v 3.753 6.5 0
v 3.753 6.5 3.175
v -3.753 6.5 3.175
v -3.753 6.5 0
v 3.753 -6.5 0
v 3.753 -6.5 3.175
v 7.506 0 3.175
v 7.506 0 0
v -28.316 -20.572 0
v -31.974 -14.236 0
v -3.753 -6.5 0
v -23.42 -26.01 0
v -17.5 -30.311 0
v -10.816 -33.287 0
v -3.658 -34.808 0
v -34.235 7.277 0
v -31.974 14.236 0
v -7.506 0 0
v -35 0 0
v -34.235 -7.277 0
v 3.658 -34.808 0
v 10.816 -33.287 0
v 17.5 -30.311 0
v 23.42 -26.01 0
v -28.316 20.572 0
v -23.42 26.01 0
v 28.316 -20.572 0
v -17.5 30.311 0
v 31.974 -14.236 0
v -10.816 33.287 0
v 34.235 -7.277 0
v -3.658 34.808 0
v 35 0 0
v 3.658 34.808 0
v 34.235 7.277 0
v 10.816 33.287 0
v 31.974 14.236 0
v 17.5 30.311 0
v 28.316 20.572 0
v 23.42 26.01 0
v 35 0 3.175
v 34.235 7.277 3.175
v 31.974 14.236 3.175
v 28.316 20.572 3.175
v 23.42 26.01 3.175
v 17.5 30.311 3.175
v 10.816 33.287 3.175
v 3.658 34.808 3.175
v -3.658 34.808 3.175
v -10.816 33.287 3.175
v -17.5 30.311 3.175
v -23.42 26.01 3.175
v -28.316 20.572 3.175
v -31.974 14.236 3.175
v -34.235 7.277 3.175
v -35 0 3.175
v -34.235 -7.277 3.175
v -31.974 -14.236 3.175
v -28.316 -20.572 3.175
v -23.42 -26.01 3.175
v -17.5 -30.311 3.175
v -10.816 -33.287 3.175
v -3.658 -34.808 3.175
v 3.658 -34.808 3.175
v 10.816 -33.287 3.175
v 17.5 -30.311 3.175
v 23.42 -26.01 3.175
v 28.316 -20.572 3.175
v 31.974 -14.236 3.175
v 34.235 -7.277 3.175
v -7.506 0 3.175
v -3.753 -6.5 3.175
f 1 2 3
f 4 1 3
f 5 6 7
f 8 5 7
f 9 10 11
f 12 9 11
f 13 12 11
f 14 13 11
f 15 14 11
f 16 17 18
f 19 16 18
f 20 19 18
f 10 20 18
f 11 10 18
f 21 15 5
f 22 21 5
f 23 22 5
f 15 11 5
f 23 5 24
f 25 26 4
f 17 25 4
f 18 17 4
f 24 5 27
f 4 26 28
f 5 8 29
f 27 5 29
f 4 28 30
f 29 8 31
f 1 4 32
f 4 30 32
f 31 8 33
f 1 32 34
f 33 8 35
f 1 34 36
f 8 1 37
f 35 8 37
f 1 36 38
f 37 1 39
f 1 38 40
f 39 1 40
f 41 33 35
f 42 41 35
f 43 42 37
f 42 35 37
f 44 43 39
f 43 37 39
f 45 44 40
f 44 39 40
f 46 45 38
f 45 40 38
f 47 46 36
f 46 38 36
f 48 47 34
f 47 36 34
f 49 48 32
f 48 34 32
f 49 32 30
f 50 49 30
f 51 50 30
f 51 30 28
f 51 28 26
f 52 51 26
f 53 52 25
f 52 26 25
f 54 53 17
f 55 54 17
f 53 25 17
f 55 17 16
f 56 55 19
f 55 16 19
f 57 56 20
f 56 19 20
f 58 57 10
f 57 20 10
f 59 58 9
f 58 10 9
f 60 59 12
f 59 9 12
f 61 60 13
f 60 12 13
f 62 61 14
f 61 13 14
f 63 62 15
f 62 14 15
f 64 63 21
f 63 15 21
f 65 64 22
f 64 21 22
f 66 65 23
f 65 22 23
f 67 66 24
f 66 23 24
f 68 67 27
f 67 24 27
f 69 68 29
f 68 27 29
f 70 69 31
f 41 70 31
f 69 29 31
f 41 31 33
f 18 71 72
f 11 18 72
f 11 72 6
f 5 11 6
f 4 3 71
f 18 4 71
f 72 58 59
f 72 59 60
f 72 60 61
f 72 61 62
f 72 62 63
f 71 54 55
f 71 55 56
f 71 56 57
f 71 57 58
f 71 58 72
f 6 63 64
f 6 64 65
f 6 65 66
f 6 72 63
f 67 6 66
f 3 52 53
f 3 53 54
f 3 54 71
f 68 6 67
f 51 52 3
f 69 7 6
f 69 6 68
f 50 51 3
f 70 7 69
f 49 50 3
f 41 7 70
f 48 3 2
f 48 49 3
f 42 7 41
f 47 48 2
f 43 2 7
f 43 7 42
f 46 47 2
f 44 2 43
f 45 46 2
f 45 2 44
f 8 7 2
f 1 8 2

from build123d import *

# Parameters (mm, degrees)
SKETCH1_R           = 35
BOSS_EXTRUDE1_DEPTH = 3.175
CUT_EXTRUDE1_REACH  = 5.175


with BuildPart() as part:
    # Sketch1 → Boss-Extrude1 (new body)
    with BuildSketch(Plane.XY):
        Circle(SKETCH1_R)
    extrude(amount=BOSS_EXTRUDE1_DEPTH)

    # Sketch2 → Cut-Extrude1 (cut, up to next)
    with BuildSketch(Plane.XY.offset(3.175), mode=Mode.PRIVATE) as cut_extrude1_sk1:
        Polygon((7.505553499, 0), (3.75277675, 6.5), (-3.75277675, 6.5), (-7.505553499, 0), (-3.75277675, -6.5), (3.75277675, -6.5), align=None)
    cut_extrude1_tool1 = extrude(cut_extrude1_sk1.sketch, amount=-CUT_EXTRUDE1_REACH, mode=Mode.PRIVATE) & part.part
    add(cut_extrude1_tool1.solids().sort_by_distance((0, 0, 3.175))[0], mode=Mode.SUBTRACT)


solid = part.part
